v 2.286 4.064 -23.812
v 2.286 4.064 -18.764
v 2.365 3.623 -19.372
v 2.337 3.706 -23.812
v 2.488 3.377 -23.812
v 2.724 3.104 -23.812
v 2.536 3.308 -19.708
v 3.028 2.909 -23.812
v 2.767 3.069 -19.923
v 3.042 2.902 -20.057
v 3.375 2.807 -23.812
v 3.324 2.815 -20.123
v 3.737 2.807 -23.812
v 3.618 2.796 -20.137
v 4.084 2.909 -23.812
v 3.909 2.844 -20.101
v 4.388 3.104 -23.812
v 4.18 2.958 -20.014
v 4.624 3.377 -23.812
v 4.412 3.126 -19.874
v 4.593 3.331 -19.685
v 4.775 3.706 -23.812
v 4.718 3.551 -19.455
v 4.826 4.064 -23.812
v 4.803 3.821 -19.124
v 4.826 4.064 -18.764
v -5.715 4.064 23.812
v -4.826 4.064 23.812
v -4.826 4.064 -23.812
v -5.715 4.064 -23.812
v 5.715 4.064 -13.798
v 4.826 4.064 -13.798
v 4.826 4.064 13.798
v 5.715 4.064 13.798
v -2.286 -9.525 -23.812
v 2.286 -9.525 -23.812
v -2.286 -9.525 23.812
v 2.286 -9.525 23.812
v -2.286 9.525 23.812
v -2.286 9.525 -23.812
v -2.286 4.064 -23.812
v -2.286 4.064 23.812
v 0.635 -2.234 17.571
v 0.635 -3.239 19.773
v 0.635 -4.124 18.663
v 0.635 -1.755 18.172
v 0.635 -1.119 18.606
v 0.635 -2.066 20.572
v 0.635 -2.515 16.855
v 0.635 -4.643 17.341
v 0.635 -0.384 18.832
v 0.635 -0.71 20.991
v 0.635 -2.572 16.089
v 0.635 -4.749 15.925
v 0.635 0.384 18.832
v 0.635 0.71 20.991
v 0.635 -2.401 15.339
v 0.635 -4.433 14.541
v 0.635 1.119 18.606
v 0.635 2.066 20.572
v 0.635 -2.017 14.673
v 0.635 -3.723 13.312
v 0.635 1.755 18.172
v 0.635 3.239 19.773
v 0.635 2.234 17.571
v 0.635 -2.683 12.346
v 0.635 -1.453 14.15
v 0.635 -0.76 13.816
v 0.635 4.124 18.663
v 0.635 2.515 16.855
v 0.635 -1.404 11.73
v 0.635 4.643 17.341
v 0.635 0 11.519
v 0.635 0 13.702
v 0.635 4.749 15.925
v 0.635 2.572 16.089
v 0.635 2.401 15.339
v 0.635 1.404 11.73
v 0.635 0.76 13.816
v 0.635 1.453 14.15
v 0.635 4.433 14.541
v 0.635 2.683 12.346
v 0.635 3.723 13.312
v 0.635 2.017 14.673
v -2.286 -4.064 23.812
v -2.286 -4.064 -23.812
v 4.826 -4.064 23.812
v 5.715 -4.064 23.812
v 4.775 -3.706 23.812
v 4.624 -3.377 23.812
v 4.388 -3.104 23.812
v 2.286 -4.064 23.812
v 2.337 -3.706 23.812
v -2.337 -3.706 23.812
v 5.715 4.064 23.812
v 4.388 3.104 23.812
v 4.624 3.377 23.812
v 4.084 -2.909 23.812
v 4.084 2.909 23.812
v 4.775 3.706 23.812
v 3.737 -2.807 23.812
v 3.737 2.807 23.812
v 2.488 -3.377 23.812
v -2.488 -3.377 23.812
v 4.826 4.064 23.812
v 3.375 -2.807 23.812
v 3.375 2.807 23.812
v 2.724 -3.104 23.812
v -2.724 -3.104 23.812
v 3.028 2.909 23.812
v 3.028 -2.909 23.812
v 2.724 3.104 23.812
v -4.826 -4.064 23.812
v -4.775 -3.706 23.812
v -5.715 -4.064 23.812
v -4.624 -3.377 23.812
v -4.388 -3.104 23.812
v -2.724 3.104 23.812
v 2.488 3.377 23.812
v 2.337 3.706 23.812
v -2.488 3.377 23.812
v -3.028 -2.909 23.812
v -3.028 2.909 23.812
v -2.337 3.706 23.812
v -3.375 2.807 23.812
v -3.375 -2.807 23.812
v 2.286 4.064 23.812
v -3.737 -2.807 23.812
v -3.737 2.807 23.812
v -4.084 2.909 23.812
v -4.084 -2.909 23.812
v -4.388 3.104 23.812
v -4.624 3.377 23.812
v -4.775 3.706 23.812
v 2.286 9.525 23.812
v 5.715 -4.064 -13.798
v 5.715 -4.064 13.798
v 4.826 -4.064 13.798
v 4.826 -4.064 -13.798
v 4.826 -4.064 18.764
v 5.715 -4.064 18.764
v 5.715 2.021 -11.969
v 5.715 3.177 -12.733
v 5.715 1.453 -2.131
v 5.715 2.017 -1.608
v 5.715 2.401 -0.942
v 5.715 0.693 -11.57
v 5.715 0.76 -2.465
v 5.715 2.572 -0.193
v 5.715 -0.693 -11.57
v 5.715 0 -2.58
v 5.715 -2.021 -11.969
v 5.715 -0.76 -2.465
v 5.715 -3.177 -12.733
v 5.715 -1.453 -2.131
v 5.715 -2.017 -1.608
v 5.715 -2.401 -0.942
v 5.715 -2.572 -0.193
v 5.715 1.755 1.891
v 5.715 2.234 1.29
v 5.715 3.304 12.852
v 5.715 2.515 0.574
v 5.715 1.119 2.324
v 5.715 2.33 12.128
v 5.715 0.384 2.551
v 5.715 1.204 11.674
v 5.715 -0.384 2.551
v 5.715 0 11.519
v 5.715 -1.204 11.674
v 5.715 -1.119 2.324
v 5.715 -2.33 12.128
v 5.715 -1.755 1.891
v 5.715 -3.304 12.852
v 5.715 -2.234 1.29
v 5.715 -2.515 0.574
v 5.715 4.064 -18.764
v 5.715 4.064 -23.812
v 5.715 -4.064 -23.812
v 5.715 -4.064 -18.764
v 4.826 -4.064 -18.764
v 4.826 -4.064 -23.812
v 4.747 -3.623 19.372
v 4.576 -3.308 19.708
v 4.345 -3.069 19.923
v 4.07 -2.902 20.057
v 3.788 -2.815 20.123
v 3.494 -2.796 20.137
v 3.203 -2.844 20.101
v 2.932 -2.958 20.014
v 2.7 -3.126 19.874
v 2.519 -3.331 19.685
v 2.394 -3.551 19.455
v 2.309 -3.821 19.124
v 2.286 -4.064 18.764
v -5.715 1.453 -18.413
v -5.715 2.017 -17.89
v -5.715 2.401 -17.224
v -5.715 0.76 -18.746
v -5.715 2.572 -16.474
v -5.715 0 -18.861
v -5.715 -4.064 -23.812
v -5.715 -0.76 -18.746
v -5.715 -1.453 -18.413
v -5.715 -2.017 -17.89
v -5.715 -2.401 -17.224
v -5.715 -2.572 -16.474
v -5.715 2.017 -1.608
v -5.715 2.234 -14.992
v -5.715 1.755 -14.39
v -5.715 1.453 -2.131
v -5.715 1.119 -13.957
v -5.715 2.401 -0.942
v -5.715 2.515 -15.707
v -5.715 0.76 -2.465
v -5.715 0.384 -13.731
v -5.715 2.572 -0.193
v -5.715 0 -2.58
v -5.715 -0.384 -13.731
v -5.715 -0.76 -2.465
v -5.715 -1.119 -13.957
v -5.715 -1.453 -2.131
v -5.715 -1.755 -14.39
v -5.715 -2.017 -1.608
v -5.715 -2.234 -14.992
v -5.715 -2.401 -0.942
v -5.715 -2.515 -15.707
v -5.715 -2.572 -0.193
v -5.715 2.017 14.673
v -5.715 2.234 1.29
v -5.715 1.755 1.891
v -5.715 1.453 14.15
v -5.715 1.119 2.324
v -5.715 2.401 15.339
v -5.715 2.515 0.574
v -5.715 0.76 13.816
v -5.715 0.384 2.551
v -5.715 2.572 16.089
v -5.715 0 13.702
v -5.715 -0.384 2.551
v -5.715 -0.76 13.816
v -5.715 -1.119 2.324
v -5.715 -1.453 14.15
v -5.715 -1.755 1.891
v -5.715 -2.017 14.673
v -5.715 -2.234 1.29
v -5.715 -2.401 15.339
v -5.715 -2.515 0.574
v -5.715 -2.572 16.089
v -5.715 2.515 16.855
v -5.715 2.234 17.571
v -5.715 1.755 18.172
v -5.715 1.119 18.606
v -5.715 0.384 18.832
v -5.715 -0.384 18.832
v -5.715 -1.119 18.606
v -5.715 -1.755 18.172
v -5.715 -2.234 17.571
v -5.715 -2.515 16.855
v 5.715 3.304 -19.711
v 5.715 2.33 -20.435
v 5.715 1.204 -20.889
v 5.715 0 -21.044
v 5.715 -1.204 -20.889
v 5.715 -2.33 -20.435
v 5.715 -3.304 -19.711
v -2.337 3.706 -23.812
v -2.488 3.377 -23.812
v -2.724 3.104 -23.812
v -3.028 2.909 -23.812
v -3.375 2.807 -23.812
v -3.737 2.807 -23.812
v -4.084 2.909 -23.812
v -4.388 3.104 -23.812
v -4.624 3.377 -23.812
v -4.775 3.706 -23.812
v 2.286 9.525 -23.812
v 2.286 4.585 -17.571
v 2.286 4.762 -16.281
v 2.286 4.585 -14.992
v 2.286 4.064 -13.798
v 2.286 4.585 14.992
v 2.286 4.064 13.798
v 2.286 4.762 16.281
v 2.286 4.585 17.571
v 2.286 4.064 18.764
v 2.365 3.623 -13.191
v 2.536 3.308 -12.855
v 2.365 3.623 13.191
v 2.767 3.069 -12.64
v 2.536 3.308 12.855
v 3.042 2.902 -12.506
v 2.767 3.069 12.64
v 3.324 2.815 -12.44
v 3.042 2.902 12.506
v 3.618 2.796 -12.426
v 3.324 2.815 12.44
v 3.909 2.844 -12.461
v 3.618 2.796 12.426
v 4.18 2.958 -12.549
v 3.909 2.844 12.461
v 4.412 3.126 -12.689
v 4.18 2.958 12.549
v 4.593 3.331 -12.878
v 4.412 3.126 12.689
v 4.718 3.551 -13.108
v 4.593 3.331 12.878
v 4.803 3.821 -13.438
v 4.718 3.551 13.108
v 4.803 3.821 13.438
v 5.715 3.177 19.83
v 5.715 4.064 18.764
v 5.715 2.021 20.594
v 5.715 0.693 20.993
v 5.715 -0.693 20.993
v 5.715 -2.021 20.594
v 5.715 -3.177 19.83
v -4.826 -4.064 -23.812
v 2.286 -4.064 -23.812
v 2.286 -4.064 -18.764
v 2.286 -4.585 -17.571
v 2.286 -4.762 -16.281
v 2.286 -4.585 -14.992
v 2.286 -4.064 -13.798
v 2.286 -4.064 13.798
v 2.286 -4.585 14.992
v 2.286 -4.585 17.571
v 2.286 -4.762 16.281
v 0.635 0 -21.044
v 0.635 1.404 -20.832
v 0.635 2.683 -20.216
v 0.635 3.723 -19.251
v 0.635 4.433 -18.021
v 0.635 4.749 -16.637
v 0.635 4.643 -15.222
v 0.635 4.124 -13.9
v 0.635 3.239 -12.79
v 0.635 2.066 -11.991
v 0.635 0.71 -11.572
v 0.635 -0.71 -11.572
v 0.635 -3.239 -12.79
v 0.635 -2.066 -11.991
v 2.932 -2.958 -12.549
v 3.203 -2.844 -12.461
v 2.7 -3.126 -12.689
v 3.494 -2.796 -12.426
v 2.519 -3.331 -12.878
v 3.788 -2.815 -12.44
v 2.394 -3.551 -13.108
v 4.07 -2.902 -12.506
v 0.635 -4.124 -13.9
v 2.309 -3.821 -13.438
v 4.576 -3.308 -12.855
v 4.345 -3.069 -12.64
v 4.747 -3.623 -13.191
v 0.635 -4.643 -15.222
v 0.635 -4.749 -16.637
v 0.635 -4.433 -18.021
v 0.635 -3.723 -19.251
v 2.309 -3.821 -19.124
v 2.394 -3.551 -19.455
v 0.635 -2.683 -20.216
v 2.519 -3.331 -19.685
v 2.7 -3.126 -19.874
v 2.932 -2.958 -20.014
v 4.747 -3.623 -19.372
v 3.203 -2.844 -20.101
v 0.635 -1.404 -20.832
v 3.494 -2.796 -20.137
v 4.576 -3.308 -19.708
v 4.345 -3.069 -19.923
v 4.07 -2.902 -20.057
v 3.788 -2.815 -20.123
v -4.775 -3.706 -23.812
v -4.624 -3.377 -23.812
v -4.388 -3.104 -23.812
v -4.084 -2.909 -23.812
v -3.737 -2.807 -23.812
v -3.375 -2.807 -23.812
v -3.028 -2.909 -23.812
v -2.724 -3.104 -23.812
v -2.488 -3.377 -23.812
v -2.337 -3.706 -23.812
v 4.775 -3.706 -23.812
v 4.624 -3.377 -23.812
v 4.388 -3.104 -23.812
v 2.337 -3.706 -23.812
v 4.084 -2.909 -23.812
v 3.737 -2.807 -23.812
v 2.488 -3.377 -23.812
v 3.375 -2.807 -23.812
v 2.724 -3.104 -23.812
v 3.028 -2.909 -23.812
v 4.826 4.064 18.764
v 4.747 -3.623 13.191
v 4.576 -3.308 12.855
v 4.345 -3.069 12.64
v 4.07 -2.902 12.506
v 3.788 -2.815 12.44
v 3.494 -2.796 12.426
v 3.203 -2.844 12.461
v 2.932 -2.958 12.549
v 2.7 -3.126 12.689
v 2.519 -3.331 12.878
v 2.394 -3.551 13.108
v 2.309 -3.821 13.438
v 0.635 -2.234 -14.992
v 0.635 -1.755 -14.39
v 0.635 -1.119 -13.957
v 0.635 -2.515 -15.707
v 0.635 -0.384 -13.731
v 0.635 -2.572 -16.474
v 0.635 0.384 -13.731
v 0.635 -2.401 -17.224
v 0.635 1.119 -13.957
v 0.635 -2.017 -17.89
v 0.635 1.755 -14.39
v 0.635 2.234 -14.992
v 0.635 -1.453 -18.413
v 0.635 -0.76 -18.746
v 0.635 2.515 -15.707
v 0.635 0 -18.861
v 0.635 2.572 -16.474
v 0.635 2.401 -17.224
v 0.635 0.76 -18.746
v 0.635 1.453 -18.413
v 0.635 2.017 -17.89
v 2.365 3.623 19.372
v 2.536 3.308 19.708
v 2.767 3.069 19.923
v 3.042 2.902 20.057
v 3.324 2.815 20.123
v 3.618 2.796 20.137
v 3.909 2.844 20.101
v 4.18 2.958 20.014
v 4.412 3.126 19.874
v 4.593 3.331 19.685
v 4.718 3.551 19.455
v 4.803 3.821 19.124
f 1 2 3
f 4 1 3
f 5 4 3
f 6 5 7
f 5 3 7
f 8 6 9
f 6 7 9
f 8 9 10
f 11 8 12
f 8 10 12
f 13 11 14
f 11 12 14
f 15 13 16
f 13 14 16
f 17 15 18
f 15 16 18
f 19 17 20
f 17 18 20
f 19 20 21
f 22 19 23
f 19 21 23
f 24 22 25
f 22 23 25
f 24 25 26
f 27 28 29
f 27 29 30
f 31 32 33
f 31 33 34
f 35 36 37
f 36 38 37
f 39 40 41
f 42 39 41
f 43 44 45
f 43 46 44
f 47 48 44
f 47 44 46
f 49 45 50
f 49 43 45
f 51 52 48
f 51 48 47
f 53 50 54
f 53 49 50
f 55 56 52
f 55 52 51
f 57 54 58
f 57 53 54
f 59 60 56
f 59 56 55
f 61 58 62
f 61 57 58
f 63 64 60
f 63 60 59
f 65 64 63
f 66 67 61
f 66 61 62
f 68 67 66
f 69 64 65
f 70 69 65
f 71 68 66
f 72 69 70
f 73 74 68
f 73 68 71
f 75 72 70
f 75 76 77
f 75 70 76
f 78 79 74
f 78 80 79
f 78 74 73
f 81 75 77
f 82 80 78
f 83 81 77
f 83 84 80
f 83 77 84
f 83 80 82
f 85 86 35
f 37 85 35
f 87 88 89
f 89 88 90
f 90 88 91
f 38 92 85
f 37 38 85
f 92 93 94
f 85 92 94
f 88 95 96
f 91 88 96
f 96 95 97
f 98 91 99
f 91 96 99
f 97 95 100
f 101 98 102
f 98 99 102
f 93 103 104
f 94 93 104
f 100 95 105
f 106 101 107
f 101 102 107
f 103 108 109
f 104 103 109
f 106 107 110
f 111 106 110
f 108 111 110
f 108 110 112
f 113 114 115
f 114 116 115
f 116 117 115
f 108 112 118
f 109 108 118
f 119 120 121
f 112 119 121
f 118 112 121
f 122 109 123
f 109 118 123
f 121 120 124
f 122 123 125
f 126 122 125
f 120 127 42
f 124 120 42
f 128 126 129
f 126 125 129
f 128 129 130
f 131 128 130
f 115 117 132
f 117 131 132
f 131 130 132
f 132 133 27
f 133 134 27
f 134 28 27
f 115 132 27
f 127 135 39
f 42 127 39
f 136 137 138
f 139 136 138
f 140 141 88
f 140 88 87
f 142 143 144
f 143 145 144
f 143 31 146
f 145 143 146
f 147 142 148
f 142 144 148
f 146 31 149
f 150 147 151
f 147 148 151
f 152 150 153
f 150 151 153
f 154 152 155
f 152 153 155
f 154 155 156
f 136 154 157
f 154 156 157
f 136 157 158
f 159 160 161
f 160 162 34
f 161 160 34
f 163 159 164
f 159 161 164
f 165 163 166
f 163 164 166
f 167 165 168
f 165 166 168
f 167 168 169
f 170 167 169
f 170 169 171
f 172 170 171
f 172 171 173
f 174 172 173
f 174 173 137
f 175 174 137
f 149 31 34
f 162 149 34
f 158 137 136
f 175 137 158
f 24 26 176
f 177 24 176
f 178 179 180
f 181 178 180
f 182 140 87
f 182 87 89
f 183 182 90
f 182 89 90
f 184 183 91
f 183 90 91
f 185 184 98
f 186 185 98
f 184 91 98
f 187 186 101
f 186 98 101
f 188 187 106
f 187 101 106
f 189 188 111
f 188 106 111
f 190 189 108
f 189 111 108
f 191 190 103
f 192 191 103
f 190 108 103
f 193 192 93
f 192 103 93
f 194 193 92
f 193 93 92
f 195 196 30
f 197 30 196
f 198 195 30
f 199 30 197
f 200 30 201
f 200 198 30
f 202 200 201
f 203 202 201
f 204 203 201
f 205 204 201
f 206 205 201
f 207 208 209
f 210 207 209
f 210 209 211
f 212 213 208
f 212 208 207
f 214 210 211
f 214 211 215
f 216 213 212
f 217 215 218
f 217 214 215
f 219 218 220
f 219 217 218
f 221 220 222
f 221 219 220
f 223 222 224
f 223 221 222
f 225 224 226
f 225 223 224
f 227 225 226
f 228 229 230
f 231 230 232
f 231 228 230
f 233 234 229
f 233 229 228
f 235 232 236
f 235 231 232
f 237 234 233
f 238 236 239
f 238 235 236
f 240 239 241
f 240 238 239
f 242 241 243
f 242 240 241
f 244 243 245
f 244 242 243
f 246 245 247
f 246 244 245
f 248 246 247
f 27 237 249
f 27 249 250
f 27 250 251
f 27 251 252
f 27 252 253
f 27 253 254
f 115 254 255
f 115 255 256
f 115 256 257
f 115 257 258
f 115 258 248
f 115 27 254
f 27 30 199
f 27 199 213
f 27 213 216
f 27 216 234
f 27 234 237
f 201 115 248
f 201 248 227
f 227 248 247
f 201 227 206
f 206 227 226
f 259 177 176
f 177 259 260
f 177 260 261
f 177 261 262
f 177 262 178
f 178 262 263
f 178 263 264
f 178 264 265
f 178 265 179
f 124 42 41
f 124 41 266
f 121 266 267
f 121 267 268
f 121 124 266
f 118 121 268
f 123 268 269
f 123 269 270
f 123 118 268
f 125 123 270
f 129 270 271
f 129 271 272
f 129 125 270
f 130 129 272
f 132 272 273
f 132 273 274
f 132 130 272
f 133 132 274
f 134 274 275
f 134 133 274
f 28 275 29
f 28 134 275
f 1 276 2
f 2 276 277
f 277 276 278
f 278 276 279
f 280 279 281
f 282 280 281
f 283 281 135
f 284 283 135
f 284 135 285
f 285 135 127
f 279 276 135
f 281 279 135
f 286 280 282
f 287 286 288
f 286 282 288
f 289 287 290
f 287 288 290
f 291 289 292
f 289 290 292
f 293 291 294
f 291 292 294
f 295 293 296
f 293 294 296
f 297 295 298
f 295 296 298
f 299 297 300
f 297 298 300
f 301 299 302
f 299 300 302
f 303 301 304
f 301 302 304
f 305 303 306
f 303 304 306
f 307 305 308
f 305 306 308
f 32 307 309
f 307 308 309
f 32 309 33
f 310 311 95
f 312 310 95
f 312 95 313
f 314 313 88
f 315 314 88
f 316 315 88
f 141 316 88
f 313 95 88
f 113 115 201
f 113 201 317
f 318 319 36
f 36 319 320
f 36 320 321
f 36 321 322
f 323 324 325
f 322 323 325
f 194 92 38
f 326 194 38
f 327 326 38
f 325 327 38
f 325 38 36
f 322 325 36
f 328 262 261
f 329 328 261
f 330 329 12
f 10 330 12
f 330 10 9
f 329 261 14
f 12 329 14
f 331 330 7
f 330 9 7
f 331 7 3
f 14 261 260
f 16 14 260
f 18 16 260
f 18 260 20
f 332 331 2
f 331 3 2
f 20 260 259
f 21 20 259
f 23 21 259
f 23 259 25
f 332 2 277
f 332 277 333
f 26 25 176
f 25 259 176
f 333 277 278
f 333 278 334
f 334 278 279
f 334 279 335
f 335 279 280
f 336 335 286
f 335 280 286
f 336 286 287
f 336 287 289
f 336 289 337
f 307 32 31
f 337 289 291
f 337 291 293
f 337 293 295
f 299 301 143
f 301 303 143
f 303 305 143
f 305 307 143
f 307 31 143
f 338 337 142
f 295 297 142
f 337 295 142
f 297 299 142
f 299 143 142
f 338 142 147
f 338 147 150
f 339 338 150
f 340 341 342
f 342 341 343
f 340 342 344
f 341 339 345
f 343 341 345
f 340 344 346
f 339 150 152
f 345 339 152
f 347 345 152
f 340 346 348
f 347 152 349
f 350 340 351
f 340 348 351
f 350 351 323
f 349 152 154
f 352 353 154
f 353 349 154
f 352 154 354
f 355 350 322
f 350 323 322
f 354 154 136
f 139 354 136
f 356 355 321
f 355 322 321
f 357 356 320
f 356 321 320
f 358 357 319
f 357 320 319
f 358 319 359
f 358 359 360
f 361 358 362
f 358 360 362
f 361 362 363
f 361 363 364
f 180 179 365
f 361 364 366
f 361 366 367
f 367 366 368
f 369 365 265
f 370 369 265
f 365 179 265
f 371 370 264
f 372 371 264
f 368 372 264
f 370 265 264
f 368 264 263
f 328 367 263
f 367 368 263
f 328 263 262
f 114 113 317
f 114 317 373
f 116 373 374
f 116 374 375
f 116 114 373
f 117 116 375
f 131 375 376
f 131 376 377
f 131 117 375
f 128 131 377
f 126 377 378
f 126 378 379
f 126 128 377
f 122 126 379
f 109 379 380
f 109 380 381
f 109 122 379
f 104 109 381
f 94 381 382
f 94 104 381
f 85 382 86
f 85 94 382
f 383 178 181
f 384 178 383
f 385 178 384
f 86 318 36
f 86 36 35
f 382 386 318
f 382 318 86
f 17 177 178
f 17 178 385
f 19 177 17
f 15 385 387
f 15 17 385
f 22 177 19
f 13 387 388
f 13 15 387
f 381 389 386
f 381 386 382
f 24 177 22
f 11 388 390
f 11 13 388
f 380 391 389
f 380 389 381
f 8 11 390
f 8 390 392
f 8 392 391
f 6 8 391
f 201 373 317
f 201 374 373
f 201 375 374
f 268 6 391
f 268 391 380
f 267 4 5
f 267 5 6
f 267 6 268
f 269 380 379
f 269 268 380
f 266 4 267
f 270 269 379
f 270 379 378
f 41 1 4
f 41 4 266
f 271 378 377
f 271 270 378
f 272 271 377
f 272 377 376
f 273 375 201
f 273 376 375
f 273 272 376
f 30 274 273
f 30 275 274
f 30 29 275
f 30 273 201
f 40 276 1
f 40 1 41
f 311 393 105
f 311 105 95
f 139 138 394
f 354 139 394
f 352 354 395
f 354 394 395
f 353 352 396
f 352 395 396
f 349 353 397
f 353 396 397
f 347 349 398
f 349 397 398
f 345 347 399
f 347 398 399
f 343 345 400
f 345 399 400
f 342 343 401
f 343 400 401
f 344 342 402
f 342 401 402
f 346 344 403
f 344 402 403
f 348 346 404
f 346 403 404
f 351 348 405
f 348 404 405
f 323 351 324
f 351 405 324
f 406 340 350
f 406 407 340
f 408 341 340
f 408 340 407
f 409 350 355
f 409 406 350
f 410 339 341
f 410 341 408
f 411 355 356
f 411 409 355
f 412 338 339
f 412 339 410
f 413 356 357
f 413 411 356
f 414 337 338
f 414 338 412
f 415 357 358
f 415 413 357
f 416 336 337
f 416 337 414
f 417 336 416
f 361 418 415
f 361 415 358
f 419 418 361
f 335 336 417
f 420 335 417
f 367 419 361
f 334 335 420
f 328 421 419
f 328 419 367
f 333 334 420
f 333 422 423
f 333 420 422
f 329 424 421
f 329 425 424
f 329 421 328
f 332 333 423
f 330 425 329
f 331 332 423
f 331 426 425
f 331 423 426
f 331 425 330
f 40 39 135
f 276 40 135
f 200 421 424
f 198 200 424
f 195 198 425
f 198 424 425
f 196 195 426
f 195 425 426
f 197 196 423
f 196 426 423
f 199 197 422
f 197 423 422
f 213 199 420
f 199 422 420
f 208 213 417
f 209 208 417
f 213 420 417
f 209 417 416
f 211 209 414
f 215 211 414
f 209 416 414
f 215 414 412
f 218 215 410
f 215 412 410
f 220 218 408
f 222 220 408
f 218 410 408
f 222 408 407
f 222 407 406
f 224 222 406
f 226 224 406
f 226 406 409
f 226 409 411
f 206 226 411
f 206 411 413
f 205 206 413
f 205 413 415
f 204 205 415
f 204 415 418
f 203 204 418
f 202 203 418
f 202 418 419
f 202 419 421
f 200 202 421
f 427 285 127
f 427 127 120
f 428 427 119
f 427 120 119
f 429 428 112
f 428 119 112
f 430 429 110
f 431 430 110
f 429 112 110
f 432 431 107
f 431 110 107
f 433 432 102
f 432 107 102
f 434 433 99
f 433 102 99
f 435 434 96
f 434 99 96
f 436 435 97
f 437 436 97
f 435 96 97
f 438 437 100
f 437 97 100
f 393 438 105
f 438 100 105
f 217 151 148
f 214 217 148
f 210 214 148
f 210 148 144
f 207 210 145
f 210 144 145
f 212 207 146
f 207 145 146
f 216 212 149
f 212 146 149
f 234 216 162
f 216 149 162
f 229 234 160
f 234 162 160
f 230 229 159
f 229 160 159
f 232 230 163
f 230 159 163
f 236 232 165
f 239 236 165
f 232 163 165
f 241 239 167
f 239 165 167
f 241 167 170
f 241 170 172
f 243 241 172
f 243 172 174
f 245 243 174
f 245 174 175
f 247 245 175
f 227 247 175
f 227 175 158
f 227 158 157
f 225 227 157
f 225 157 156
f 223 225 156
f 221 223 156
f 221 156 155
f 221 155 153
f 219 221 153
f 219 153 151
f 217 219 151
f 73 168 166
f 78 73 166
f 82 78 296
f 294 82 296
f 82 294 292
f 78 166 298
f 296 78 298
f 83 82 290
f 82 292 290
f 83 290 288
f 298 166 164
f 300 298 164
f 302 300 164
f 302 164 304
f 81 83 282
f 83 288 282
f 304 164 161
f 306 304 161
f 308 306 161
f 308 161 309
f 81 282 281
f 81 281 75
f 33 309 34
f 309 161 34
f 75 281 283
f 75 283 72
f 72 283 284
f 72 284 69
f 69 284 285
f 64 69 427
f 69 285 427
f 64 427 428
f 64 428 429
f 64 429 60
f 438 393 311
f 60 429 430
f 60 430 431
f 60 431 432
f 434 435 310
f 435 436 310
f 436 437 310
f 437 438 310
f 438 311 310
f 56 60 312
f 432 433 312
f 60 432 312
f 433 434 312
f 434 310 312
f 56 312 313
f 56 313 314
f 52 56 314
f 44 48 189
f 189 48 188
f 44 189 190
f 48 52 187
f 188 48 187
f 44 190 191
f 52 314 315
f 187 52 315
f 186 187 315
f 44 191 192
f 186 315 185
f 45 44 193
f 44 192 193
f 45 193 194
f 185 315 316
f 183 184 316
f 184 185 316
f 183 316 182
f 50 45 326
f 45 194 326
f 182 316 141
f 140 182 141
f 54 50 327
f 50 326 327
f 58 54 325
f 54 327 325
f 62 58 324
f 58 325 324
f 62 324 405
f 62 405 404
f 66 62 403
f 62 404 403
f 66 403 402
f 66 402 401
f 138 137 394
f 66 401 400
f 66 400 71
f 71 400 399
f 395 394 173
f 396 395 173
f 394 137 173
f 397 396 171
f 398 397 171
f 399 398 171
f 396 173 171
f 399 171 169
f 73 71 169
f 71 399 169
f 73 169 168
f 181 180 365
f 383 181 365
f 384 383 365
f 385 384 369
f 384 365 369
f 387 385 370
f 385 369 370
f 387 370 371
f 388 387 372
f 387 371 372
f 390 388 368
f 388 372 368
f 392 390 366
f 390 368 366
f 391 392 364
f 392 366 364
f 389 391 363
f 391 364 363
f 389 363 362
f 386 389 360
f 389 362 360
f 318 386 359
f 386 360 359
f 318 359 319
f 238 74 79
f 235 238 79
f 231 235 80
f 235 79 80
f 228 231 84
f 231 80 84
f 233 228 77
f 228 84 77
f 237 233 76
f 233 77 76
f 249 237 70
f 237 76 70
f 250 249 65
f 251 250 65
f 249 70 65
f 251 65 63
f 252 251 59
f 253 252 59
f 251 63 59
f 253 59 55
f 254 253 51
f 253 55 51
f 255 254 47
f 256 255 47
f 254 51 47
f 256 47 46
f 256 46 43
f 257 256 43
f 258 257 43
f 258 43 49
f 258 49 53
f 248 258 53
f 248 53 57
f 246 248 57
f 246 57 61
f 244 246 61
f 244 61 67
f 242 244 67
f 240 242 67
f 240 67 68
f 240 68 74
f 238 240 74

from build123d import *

# Parameters (mm, degrees)
BOSS_EXTRUDE1_DEPTH = 23.8125
SKETCH2_R           = 2.5796875
CUT_EXTRUDE1_DEPTH  = 12.43
SKETCH3_R           = 4.7625
CUT_EXTRUDE2_DEPTH  = 5.08


with BuildPart() as part:
    # Sketch1 → Boss-Extrude1 (new body, symmetric)
    with BuildSketch(Plane.XY):
        with BuildLine():
            Line((0, -9.525), (0, 9.525))
            Line((0, 9.525), (-2.286, 9.525))
            Line((-2.286, 9.525), (-2.286, 4.064))
            ThreePointArc((-2.286, 4.064), (-3.556, 2.794), (-4.826, 4.064))
            Line((-4.826, 4.064), (-5.715, 4.064))
            Line((-5.715, 4.064), (-5.715, -4.064))
            Line((-5.715, -4.064), (-4.826, -4.064))
            ThreePointArc((-4.826, -4.064), (-3.556, -2.794), (-2.286, -4.064))
            Line((-2.286, -4.064), (-2.286, -9.525))
            Line((-2.286, -9.525), (0, -9.525))
        make_face()
    boss_extrude1 = extrude(amount=BOSS_EXTRUDE1_DEPTH, both=True)

    # Mirror1: Boss-Extrude1 across plane
    add(boss_extrude1.mirror(Plane(origin=(0, -9.525, 23.8125), x_dir=(0, 0, 1), z_dir=(-1, 0, 0))))

    # Sketch2 → Cut-Extrude1 (cut, through all)
    with BuildSketch(Plane(origin=(5.715, 0, 0), x_dir=(0, 0, -1), z_dir=(1, 0, 0))):
        with Locations((-16.2814, 0)):
            Circle(SKETCH2_R)
        with Locations((16.2814, 0)):
            Circle(SKETCH2_R)
        Circle(SKETCH2_R)
    extrude(amount=-CUT_EXTRUDE1_DEPTH, mode=Mode.SUBTRACT)

    # Sketch3 → Cut-Extrude2 (cut)
    with BuildSketch(Plane(origin=(5.715, 0, 0), x_dir=(0, 0, -1), z_dir=(1, 0, 0))):
        with Locations((-16.2814, 0)):
            Circle(SKETCH3_R)
        with Locations((16.2814, 0)):
            Circle(SKETCH3_R)
    extrude(amount=-CUT_EXTRUDE2_DEPTH, mode=Mode.SUBTRACT)


solid = part.part
